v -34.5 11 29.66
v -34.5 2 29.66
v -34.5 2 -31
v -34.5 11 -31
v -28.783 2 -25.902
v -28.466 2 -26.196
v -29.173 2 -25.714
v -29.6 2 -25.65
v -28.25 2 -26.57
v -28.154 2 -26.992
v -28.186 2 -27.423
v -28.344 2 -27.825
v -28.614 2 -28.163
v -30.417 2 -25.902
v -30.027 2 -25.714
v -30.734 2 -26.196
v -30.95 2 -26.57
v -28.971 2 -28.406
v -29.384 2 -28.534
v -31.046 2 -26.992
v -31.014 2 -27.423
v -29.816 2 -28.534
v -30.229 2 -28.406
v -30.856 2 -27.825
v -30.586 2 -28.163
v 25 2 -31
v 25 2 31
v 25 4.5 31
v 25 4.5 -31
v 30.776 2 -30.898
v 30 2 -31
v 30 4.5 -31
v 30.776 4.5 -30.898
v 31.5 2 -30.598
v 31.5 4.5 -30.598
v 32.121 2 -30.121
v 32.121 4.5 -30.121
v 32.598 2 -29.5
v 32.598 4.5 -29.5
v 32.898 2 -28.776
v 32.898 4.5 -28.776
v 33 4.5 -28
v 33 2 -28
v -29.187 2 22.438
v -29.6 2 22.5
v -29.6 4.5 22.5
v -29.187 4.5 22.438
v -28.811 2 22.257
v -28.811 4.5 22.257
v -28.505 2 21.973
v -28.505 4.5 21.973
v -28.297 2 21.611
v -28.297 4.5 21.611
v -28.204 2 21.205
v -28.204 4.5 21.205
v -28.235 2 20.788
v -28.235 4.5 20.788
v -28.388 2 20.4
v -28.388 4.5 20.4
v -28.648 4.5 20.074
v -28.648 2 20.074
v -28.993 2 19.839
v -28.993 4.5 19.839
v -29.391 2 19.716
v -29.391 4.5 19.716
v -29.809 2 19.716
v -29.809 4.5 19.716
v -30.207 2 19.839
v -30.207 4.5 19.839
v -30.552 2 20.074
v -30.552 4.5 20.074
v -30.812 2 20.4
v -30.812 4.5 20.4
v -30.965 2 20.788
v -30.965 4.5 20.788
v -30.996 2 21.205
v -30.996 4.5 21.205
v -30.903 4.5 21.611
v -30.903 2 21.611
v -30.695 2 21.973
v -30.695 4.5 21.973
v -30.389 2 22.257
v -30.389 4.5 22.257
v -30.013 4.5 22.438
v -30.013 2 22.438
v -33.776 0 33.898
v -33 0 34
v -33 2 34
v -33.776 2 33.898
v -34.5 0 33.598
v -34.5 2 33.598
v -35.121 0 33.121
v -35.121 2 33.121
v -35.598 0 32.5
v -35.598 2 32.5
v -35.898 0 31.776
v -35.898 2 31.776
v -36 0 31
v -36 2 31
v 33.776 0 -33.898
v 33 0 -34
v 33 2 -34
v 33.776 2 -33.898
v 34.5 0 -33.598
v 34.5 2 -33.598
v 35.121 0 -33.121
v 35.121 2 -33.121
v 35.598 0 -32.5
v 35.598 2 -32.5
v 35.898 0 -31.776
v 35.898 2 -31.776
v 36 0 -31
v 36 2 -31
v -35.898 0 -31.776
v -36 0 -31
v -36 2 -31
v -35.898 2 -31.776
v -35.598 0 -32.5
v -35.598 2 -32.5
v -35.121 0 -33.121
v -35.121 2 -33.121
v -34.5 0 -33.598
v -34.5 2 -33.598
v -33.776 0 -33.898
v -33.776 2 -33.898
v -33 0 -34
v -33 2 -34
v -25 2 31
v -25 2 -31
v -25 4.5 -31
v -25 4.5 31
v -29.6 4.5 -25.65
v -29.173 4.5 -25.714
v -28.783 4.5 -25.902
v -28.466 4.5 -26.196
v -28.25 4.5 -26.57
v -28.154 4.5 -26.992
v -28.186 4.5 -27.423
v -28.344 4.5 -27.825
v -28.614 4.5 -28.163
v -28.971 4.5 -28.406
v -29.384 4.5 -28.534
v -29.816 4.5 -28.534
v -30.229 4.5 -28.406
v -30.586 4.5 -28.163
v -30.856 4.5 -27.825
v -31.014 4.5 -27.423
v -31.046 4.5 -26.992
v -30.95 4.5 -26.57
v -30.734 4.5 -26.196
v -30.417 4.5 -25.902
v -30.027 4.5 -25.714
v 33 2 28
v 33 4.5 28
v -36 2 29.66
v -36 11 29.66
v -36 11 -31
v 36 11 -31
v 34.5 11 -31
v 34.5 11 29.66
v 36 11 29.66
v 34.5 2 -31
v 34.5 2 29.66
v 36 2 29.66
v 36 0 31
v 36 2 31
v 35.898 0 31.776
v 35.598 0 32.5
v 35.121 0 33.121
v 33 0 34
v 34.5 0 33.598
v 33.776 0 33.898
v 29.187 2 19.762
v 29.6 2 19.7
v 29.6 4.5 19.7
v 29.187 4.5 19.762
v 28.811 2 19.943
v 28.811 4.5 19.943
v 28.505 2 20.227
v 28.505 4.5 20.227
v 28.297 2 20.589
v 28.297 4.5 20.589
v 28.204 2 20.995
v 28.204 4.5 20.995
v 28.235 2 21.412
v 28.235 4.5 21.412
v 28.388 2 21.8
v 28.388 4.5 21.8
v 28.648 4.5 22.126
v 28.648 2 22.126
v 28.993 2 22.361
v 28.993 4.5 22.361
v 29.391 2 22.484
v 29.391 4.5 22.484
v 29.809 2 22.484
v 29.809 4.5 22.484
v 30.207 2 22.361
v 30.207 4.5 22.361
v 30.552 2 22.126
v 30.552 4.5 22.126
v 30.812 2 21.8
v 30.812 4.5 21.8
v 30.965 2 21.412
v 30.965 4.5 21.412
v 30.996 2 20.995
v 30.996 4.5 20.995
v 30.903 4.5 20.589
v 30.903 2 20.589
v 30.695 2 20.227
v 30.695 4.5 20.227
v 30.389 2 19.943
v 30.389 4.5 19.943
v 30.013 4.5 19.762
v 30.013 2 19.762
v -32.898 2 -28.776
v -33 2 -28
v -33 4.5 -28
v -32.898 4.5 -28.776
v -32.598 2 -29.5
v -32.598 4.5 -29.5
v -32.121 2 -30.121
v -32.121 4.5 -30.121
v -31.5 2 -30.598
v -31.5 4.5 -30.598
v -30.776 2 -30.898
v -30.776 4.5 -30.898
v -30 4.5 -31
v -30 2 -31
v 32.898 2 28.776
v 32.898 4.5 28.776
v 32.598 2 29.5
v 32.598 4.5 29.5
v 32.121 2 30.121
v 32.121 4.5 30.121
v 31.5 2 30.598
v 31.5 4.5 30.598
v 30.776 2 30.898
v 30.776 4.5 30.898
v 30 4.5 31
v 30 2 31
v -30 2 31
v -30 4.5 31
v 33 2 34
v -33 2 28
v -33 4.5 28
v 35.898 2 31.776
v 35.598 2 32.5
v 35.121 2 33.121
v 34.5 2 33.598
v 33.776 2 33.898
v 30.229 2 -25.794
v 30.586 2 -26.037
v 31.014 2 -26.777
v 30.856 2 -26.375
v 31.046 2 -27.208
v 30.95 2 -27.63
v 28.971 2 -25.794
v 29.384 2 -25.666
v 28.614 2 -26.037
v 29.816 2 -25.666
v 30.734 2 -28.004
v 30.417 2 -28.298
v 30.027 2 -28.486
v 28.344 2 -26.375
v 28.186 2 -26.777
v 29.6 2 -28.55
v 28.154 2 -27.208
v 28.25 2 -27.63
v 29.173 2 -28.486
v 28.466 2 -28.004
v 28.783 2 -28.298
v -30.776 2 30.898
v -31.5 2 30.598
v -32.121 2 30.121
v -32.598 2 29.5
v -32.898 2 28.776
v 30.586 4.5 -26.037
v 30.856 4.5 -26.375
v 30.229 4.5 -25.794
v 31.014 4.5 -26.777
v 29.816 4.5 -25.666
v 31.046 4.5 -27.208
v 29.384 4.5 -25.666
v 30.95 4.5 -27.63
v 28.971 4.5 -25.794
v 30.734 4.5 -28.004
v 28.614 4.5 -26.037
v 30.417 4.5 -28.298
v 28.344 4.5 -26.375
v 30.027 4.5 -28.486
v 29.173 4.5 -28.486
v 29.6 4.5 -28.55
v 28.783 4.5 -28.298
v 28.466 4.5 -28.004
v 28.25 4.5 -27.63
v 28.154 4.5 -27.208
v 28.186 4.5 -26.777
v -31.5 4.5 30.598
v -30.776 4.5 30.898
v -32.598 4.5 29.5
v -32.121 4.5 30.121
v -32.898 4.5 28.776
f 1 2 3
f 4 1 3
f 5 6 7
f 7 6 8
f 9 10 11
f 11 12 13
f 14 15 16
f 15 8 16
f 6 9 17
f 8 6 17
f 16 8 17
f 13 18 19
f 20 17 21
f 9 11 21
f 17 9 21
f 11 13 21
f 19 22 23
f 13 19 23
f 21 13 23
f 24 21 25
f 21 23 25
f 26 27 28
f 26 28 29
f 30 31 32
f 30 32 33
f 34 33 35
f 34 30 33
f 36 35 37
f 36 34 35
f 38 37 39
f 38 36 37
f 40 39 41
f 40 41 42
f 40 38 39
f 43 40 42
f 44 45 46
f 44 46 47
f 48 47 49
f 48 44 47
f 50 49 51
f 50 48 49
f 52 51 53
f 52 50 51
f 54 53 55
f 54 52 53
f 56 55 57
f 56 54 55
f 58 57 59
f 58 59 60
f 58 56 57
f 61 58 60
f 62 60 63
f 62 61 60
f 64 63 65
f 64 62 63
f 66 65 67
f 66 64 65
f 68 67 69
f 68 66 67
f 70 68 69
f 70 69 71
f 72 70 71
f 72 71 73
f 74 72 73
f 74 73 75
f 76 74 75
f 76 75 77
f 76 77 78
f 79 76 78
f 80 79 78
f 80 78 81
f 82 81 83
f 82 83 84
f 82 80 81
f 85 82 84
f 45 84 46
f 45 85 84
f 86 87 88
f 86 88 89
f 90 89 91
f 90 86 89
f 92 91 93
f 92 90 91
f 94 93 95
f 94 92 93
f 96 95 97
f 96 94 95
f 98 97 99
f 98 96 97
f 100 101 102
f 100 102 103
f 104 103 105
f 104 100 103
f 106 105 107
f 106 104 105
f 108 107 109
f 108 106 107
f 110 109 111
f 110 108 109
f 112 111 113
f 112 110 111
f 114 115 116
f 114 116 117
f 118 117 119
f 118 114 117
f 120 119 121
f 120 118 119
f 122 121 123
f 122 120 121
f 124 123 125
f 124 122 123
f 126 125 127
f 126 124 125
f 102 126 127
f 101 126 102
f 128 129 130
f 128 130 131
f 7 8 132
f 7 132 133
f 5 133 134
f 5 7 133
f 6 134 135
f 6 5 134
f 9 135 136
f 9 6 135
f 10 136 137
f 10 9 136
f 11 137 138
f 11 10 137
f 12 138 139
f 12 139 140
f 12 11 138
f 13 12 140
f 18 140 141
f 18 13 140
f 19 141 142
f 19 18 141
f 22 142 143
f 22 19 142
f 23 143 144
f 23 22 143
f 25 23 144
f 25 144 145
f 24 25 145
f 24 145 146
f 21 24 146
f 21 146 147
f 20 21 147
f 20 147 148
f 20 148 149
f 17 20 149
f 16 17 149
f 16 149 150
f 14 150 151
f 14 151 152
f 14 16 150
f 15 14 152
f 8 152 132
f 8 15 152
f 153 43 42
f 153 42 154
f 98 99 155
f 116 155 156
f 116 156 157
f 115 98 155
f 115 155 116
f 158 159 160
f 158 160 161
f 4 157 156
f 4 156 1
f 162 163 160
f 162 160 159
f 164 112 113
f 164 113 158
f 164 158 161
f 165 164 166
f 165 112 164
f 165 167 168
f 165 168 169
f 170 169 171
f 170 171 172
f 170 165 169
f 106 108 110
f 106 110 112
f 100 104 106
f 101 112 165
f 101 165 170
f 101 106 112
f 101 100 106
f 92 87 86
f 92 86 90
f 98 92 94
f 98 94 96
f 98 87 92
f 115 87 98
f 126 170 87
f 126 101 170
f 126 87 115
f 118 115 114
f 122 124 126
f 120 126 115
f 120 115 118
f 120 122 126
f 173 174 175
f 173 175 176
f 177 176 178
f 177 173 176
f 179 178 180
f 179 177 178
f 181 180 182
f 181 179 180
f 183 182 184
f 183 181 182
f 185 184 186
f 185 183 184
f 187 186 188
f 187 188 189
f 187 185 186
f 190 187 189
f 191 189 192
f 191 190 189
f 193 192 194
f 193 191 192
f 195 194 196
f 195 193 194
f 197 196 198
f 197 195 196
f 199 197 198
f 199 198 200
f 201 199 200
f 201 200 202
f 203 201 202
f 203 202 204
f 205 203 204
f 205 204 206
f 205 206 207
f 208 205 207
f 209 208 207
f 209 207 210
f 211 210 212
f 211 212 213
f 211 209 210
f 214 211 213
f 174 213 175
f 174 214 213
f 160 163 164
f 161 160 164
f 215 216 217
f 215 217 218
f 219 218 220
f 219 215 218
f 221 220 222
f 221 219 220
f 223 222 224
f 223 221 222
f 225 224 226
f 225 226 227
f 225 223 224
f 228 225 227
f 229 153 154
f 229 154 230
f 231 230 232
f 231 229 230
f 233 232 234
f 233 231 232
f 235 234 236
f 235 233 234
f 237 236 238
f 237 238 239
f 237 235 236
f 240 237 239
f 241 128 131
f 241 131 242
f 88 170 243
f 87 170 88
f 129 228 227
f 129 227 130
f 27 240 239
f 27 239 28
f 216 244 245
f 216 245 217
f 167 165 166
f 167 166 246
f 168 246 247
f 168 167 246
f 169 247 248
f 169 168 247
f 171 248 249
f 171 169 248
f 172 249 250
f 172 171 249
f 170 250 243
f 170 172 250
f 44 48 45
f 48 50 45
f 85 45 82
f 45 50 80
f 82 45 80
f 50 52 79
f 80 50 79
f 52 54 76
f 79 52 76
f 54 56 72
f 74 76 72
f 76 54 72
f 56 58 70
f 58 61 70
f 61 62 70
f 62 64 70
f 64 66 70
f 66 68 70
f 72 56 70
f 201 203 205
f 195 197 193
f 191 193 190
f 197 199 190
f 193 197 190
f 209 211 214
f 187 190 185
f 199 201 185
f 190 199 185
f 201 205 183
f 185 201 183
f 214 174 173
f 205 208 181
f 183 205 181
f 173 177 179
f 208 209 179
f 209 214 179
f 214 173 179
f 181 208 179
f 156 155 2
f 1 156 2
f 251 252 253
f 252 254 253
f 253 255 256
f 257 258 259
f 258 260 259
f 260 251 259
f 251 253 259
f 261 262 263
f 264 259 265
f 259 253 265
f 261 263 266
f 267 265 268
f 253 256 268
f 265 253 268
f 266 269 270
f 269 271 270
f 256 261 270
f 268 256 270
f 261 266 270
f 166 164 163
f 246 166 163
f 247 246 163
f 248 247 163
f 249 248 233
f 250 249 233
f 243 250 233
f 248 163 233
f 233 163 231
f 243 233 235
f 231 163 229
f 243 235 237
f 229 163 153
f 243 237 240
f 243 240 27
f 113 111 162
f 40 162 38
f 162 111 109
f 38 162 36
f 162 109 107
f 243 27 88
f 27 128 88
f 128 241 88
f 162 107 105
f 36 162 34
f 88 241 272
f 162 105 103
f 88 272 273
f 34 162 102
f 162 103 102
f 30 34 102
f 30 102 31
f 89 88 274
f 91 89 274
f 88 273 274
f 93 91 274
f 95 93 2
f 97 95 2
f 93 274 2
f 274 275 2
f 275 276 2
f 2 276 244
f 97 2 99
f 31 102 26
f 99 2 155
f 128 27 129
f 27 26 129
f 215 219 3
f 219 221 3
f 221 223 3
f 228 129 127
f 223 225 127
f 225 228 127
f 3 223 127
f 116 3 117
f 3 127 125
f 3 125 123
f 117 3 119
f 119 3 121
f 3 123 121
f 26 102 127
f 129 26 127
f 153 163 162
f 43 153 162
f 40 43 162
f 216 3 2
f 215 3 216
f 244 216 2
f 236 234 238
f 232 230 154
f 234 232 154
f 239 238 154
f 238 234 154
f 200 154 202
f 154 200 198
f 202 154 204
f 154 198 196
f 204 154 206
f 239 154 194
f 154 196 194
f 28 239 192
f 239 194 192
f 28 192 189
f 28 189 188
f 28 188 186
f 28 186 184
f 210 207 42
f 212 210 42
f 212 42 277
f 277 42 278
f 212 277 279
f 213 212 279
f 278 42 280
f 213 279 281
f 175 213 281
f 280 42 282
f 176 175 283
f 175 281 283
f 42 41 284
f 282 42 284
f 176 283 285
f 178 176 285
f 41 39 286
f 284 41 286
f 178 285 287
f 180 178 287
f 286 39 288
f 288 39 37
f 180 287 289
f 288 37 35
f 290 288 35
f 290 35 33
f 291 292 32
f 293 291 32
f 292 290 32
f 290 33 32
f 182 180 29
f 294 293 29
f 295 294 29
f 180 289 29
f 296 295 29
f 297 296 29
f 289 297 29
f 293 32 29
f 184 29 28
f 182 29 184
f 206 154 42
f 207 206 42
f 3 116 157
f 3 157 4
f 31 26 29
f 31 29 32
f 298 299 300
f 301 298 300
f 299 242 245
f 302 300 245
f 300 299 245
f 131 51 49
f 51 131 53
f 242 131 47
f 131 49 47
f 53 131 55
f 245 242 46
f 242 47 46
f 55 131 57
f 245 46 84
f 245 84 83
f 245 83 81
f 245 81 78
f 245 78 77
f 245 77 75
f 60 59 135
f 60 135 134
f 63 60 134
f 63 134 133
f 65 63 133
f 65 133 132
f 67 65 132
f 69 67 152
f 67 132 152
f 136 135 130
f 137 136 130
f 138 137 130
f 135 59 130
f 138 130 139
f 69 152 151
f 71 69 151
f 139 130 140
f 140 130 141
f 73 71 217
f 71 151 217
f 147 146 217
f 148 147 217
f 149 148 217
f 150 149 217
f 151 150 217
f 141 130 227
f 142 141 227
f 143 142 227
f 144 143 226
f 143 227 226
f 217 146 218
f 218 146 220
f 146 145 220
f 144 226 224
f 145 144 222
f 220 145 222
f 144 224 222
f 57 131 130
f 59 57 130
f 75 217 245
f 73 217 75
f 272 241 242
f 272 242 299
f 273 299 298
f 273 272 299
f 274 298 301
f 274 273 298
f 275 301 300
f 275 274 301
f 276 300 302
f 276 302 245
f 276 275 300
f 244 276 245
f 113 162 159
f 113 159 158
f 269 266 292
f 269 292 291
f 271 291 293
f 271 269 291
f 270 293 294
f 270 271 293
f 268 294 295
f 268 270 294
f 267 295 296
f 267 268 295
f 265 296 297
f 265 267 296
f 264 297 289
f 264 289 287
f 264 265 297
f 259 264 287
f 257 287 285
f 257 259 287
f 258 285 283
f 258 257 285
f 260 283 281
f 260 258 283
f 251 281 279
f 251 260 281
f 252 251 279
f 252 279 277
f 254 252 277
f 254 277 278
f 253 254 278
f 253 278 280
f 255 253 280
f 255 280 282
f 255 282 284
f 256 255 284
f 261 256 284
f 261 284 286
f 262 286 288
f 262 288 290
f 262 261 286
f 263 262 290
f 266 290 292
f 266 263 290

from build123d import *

# Parameters (mm, degrees)
EXTRUDE_1_DEPTH = 2
SKETCH_3_W      = 1.5
SKETCH_3_H      = 60.659832998
EXTRUDE_2_DEPTH = 9
SKETCH_4_R      = 1.45
SKETCH_4_R_2    = 1.4
EXTRUDE_3_DEPTH = 2.5


with BuildPart() as part:
    # 草图2 → 凸台-拉伸1 (new body)
    with BuildSketch(Plane(origin=(0, 0, 0), x_dir=(1, 0, 0), z_dir=(0, 1, 0))):
        with BuildLine():
            Line((-33, 34), (33, 34))
            ThreePointArc((33, 34), (35.121320344, 33.121320344), (36, 31))
            Line((36, 31), (36, -31))
            ThreePointArc((36, -31), (35.121320344, -33.121320344), (33, -34))
            Line((33, -34), (-33, -34))
            ThreePointArc((-33, -34), (-35.121320344, -33.121320344), (-36, -31))
            Line((-36, -31), (-36, 31))
            ThreePointArc((-36, 31), (-35.121320344, 33.121320344), (-33, 34))
        make_face()
    extrude(amount=EXTRUDE_1_DEPTH)

    # 草图3 → 凸台-拉伸2 (add)
    with BuildSketch(Plane(origin=(0, 2, 0), x_dir=(1, 0, 0), z_dir=(0, 1, 0))):
        with Locations((-35.25, 0.670083501)):
            Rectangle(SKETCH_3_W, SKETCH_3_H)
        with Locations((35.25, 0.670083501)):
            Rectangle(SKETCH_3_W, SKETCH_3_H)
    extrude(amount=EXTRUDE_2_DEPTH)

    # 草图4 → 凸台-拉伸3 (add)
    # profile 1 of 2: a face of its own
    with BuildSketch(Plane(origin=(0, 2, 0), x_dir=(1, 0, 0), z_dir=(0, 1, 0))):
        with BuildLine():
            Line((-30, 31), (-25, 31))
            Line((-25, 31), (-25, -31))
            Line((-25, -31), (-30, -31))
            ThreePointArc((-30, -31), (-32.121320344, -30.121320344), (-33, -28))
            Line((-33, -28), (-33, 28))
            ThreePointArc((-33, 28), (-32.121320344, 30.121320344), (-30, 31))
        make_face()
        with Locations(Location((-29.6, 27.1, 0), (0, 0, 270))):
            Circle(SKETCH_4_R, mode=Mode.SUBTRACT)
        with Locations(Location((-29.6, -21.1, 0), (0, 0, 270))):
            Circle(SKETCH_4_R_2, mode=Mode.SUBTRACT)
    # profile 2 of 2: a face of its own
    with BuildSketch(Plane(origin=(0, 2, 0), x_dir=(1, 0, 0), z_dir=(0, 1, 0))):
        with BuildLine():
            Line((30, -31), (25, -31))
            Line((25, -31), (25, 31))
            Line((25, 31), (30, 31))
            ThreePointArc((30, 31), (32.121320344, 30.121320344), (33, 28))
            Line((33, 28), (33, -28))
            ThreePointArc((33, -28), (32.121320344, -30.121320344), (30, -31))
        make_face()
        with Locations(Location((29.6, 27.1, 0), (0, 0, 90))):
            Circle(SKETCH_4_R, mode=Mode.SUBTRACT)
        with Locations(Location((29.6, -21.1, 0), (0, 0, 90))):
            Circle(SKETCH_4_R_2, mode=Mode.SUBTRACT)
    extrude(amount=EXTRUDE_3_DEPTH)


solid = part.part
